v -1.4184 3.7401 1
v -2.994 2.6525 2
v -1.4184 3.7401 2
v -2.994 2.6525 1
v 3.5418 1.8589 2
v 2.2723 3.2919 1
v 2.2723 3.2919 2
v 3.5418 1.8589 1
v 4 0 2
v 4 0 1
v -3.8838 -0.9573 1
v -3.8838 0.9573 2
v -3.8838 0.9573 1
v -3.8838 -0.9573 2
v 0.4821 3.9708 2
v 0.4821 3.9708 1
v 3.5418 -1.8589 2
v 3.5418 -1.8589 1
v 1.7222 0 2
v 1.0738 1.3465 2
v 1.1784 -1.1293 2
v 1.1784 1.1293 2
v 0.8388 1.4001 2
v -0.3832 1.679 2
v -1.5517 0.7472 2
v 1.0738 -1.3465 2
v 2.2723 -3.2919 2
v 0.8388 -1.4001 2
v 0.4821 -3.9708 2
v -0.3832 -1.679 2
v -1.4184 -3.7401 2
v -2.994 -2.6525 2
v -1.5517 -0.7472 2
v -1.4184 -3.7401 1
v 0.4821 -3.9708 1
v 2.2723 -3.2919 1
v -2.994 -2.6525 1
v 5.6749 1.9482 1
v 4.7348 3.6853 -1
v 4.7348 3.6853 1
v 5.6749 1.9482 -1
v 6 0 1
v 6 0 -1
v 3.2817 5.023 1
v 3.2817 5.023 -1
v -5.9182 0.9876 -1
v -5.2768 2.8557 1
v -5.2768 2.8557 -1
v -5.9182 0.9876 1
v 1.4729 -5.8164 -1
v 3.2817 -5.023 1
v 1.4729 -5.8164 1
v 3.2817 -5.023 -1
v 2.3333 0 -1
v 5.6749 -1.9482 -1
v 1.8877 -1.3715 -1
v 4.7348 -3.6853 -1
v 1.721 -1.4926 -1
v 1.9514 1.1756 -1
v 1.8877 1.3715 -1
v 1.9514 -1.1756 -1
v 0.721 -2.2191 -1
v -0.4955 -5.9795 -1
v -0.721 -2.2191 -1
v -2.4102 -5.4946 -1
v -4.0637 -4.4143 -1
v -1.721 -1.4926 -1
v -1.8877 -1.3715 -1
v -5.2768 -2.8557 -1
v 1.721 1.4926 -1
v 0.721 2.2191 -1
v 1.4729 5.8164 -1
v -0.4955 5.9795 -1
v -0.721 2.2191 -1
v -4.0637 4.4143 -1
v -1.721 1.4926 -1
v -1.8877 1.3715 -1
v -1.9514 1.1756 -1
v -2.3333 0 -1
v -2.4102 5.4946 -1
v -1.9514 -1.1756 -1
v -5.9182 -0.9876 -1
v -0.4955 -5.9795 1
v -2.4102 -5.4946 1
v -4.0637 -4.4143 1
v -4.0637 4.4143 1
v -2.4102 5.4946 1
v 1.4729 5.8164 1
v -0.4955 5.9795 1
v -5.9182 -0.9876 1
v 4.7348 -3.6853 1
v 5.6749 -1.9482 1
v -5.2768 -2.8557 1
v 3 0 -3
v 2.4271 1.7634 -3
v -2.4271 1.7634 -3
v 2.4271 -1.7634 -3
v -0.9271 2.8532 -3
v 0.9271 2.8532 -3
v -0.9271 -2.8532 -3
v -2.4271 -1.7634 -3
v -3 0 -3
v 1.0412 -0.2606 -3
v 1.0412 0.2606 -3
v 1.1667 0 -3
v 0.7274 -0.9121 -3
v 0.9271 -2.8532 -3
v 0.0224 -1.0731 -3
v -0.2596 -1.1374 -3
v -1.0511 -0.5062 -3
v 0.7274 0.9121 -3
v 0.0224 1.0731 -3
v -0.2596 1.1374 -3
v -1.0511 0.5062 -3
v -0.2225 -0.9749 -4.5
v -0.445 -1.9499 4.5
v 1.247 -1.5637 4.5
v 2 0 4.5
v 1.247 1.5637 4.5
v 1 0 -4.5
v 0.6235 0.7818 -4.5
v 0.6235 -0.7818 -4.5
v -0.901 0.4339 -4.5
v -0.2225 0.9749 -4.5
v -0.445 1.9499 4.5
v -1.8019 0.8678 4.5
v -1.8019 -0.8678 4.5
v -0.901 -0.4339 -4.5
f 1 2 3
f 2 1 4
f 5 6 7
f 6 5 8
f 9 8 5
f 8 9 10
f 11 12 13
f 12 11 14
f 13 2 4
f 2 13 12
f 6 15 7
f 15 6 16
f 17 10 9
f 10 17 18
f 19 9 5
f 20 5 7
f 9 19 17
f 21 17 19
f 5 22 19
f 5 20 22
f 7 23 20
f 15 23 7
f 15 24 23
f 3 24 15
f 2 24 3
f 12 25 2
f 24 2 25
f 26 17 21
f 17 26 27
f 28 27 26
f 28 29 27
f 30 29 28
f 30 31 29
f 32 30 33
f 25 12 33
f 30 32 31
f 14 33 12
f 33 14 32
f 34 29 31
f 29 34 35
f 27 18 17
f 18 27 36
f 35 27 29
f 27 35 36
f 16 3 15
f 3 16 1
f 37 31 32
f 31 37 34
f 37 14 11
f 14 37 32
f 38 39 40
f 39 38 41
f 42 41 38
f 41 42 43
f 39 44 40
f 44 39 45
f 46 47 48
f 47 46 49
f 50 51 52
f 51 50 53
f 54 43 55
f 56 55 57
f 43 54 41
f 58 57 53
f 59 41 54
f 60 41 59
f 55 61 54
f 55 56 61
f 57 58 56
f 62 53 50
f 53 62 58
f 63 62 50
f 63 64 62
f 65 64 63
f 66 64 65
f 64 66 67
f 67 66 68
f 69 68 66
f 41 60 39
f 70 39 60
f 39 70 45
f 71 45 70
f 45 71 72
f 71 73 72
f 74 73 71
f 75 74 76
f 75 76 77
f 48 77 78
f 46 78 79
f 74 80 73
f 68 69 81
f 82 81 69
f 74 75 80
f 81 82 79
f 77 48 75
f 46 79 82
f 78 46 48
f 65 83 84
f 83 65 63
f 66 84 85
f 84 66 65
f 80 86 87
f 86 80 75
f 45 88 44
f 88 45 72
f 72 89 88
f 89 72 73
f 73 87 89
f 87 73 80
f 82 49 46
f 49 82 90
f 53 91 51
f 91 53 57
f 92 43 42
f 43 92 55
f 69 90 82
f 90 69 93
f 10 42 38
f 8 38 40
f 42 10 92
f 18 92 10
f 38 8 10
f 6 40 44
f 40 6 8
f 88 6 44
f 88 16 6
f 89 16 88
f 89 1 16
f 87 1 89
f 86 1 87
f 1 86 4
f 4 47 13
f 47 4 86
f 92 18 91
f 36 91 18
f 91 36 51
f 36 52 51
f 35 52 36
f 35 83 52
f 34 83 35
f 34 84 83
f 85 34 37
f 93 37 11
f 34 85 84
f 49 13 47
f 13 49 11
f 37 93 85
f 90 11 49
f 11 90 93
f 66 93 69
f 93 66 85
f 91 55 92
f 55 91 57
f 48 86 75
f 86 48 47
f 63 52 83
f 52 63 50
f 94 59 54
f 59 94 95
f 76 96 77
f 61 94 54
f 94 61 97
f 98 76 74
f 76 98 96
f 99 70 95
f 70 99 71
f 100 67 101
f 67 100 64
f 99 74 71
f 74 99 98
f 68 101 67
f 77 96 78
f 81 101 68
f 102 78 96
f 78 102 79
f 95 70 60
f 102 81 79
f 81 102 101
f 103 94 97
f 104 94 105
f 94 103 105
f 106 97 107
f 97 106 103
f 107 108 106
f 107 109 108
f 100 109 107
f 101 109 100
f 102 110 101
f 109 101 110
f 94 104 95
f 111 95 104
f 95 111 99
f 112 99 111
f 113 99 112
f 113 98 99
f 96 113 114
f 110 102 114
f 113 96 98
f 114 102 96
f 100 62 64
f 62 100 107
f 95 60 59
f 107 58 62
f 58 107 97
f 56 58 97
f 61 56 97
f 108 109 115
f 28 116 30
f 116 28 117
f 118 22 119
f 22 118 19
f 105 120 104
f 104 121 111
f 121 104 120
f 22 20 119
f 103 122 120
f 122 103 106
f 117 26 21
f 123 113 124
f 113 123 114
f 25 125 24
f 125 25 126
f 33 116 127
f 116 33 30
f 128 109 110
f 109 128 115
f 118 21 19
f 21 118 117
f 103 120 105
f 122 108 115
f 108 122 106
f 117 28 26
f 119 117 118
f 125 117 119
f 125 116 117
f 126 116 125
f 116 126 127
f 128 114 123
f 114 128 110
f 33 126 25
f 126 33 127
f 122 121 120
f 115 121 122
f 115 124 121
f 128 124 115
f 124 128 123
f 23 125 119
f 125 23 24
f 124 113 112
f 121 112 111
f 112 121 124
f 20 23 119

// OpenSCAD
///@file 2cyclinder.scad
/*
  Special variables control the number
   of facets used to generate an arc.

  $fa minimum fragment angle, default 12.
  $fs fragment size, default 2.
  $fn number of fragments. default 0.
*/
$fa = 12;
$fs = 2;
$fn = 0; // try different values here...


color("blue")
  cylinder( h=2, r=4 );

// # makes preview of object transparent

#cylinder( h=2, r=6, center=true );

// a cone

cylinder( h=6, r1=3, r2=1, center=true );


#cylinder( h=9, r1=1, r2=2, center=true);


//# sphere( r = 9, $fn=80 );
        // uses an embedded $fn

// see also polyhedron()...


//---------EoF-------
